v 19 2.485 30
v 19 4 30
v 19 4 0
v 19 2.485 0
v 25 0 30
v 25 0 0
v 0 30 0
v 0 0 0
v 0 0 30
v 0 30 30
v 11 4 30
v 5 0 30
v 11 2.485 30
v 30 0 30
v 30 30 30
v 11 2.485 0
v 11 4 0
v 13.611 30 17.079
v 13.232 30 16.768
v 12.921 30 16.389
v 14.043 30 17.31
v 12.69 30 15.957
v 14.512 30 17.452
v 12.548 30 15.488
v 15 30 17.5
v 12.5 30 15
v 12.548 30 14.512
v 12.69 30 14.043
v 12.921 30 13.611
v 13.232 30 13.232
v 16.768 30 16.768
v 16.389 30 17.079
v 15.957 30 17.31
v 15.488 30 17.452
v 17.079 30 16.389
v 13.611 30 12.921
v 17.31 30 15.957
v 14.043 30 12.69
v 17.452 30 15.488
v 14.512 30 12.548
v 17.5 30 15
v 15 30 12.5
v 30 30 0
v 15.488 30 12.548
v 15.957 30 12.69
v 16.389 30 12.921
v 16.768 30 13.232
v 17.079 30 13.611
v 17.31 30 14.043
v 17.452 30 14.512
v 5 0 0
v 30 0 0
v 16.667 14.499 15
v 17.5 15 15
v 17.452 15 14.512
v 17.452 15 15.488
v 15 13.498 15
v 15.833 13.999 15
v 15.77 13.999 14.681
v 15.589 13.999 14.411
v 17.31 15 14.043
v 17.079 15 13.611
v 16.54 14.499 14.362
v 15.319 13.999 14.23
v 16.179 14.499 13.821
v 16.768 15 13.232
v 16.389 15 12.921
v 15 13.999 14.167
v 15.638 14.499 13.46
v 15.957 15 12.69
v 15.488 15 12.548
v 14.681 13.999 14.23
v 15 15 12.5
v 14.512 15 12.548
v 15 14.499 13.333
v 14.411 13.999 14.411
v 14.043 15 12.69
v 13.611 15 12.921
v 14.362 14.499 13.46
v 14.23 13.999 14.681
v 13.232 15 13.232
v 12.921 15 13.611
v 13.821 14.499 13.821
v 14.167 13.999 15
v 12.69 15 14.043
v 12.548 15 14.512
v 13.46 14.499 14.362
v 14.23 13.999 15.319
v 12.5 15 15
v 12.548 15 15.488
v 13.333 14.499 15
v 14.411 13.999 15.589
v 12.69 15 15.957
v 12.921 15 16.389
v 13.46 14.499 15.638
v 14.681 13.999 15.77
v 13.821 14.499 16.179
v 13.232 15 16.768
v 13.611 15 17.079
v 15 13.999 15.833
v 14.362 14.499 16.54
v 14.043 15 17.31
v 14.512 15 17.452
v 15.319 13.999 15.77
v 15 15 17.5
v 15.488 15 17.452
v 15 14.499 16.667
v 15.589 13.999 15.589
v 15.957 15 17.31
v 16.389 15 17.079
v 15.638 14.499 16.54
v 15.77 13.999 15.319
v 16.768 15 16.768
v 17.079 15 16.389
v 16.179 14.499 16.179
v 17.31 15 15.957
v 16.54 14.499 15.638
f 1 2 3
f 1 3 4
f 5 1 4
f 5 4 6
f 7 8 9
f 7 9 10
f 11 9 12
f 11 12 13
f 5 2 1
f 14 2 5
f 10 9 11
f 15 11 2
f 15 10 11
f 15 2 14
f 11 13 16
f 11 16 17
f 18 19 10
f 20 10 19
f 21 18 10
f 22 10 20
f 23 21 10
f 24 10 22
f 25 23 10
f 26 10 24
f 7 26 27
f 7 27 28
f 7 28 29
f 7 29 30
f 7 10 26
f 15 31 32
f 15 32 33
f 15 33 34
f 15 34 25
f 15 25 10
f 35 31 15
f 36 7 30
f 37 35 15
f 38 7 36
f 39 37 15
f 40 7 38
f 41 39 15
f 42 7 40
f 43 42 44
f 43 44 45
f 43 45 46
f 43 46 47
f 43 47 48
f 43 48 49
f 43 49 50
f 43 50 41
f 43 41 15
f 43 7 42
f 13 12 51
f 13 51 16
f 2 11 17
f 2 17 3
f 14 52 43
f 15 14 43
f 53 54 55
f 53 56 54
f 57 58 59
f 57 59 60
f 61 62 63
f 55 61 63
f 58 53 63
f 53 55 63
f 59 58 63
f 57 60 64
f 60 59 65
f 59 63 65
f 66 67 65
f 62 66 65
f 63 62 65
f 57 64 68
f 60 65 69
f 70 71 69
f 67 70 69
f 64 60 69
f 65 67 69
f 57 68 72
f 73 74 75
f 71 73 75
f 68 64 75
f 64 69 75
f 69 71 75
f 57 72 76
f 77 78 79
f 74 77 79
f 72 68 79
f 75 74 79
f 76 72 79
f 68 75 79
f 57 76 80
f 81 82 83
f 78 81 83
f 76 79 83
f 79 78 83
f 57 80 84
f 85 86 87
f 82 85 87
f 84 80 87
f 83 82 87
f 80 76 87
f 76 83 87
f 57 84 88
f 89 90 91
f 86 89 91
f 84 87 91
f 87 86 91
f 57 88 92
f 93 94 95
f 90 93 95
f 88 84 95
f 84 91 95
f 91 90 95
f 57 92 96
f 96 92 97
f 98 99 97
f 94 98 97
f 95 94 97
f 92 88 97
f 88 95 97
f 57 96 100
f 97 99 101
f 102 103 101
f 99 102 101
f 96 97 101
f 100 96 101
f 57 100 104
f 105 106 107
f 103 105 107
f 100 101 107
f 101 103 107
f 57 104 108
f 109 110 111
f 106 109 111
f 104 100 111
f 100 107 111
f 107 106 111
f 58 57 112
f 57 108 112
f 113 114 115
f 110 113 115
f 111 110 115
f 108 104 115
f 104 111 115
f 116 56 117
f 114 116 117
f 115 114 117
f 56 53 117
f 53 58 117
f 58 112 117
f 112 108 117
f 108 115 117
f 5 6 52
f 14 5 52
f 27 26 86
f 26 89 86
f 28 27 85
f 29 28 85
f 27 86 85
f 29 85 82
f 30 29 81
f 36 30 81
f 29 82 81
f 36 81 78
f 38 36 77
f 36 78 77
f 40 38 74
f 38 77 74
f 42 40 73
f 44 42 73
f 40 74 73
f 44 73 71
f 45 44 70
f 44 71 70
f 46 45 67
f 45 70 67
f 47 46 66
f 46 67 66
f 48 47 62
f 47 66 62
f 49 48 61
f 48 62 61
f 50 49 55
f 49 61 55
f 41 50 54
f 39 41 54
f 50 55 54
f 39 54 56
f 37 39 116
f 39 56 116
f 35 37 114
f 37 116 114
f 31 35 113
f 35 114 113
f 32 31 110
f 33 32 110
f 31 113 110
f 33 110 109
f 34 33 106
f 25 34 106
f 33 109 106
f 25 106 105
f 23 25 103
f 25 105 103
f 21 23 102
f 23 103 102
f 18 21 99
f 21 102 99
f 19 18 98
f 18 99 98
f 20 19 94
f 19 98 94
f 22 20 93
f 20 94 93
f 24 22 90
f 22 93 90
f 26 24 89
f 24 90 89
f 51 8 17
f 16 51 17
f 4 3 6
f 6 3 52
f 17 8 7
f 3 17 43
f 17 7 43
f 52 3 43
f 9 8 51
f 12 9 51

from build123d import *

# Parameters (mm, degrees)
SKETCH_1_W             = 30
SKETCH_1_H             = 30
EXTRUDE_1_DEPTH        = 30
CUT_EXTRUDE_1_DEPTH    = 52.961524227
HOLE_WIZARD_M6_1_D     = 5
HOLE_WIZARD_M6_1_DEPTH = 15
HOLE_WIZARD_M6_1_TIP   = 1.502151548


with BuildPart() as part:
    # 草图1 → 凸台-拉伸1 (new body)
    with BuildSketch(Plane.XY):
        with Locations((15, 15)):
            Rectangle(SKETCH_1_W, SKETCH_1_H)
    extrude(amount=EXTRUDE_1_DEPTH)

    # 草图2 → 切除-拉伸1 (cut, through all)
    with BuildSketch(Plane.XY.offset(30)):
        Polygon((5, 0), (11, 2.485281374), (11, 4), (19, 4), (19, 2.485281374), (25, 0), align=None)
    extrude(amount=-CUT_EXTRUDE_1_DEPTH, mode=Mode.SUBTRACT)

    # M6 螺纹孔1
    with Locations(Plane(origin=(0, 30, 0), x_dir=(1, 0, 0), z_dir=(0, 1, 0))):
        with Locations((15, -15)):
            Hole(HOLE_WIZARD_M6_1_D / 2, depth=HOLE_WIZARD_M6_1_DEPTH)
            with Locations((0, 0, -(HOLE_WIZARD_M6_1_DEPTH + HOLE_WIZARD_M6_1_TIP / 2))):  # 118° drill point
                Cone(0, HOLE_WIZARD_M6_1_D / 2, HOLE_WIZARD_M6_1_TIP, mode=Mode.SUBTRACT)


solid = part.part
